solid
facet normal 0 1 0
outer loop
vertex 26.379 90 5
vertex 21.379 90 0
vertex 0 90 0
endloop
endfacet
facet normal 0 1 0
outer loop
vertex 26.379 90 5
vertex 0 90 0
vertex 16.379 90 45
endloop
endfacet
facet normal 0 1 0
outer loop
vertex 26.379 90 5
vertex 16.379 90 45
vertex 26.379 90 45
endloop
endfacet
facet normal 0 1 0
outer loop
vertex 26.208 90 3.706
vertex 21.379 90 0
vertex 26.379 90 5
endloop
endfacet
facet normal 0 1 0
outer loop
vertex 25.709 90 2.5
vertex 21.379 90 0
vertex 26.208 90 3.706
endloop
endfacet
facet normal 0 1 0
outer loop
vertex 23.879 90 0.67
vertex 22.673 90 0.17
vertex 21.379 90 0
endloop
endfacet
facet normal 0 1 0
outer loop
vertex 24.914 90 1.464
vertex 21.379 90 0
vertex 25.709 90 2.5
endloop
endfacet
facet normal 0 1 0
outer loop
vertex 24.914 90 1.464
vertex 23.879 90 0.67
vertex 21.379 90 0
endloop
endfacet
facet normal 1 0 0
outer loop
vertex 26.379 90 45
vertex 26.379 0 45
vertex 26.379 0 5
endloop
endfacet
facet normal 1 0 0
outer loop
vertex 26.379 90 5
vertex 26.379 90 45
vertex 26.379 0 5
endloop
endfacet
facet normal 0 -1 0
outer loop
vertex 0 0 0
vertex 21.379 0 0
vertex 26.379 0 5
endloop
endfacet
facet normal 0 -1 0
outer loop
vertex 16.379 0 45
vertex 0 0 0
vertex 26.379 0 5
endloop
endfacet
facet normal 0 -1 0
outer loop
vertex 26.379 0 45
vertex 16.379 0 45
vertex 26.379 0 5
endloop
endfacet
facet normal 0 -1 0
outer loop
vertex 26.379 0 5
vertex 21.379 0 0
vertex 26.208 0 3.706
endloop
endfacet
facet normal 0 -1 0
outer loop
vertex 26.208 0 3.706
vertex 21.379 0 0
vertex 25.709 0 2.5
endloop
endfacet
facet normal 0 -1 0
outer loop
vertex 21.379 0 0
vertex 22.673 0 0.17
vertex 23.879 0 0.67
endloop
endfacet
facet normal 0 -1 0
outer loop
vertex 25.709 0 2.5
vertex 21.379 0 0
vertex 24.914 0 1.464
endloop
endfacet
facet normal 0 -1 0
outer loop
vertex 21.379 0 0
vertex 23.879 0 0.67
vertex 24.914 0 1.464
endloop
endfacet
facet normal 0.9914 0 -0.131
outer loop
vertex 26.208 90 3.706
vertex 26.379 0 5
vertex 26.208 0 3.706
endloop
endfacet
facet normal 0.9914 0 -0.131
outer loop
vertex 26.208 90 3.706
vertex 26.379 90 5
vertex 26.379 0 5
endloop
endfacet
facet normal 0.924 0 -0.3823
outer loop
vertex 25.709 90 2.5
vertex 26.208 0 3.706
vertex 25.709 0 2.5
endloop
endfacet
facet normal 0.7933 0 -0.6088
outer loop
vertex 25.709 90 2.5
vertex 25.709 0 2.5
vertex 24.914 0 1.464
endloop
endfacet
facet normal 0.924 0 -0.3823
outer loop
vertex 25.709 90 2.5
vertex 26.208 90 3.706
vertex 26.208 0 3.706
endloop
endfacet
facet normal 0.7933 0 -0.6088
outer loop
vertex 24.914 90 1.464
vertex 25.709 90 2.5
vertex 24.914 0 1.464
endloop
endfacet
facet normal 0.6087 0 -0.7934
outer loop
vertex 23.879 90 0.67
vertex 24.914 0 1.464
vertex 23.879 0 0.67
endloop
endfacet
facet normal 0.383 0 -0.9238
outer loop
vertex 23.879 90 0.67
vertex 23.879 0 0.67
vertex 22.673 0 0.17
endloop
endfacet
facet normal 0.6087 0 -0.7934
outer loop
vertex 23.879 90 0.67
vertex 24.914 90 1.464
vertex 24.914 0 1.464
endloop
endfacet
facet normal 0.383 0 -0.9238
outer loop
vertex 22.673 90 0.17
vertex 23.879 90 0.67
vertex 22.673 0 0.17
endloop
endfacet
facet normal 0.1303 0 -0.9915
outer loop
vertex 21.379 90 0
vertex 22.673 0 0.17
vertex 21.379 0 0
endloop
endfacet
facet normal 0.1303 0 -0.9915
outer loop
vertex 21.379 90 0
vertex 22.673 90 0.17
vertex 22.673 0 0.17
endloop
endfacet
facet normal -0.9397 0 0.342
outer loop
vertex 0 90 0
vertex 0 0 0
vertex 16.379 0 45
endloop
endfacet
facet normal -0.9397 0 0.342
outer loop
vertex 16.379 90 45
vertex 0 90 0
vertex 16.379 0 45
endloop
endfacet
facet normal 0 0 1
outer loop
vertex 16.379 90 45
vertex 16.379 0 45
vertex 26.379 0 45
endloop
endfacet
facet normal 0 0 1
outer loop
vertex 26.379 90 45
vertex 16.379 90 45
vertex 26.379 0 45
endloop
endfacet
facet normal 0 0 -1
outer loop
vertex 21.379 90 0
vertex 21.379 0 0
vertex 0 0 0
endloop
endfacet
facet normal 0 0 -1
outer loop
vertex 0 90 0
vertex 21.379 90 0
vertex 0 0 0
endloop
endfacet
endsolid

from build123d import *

# Parameters (mm, degrees)
EXTRUDE_1_DEPTH = 90
FILLET_1_R      = 5


with BuildPart() as part:
    # 草图1 → 凸台-拉伸1 (new body)
    with BuildSketch(Plane(origin=(0, 0, 0), x_dir=(1, 0, 0), z_dir=(0, 1, 0))):
        Polygon((0, 0), (16.378660542, -45), (26.378660542, -45), (26.378660542, 0), align=None)
    extrude(amount=EXTRUDE_1_DEPTH)

    # 圆角1
    fillet_1_edges = [part.edges().sort_by_distance(p)[0] for p in [
        (26.378660542, 45, 0),
    ]]
    fillet(fillet_1_edges, radius=FILLET_1_R)


solid = part.part
